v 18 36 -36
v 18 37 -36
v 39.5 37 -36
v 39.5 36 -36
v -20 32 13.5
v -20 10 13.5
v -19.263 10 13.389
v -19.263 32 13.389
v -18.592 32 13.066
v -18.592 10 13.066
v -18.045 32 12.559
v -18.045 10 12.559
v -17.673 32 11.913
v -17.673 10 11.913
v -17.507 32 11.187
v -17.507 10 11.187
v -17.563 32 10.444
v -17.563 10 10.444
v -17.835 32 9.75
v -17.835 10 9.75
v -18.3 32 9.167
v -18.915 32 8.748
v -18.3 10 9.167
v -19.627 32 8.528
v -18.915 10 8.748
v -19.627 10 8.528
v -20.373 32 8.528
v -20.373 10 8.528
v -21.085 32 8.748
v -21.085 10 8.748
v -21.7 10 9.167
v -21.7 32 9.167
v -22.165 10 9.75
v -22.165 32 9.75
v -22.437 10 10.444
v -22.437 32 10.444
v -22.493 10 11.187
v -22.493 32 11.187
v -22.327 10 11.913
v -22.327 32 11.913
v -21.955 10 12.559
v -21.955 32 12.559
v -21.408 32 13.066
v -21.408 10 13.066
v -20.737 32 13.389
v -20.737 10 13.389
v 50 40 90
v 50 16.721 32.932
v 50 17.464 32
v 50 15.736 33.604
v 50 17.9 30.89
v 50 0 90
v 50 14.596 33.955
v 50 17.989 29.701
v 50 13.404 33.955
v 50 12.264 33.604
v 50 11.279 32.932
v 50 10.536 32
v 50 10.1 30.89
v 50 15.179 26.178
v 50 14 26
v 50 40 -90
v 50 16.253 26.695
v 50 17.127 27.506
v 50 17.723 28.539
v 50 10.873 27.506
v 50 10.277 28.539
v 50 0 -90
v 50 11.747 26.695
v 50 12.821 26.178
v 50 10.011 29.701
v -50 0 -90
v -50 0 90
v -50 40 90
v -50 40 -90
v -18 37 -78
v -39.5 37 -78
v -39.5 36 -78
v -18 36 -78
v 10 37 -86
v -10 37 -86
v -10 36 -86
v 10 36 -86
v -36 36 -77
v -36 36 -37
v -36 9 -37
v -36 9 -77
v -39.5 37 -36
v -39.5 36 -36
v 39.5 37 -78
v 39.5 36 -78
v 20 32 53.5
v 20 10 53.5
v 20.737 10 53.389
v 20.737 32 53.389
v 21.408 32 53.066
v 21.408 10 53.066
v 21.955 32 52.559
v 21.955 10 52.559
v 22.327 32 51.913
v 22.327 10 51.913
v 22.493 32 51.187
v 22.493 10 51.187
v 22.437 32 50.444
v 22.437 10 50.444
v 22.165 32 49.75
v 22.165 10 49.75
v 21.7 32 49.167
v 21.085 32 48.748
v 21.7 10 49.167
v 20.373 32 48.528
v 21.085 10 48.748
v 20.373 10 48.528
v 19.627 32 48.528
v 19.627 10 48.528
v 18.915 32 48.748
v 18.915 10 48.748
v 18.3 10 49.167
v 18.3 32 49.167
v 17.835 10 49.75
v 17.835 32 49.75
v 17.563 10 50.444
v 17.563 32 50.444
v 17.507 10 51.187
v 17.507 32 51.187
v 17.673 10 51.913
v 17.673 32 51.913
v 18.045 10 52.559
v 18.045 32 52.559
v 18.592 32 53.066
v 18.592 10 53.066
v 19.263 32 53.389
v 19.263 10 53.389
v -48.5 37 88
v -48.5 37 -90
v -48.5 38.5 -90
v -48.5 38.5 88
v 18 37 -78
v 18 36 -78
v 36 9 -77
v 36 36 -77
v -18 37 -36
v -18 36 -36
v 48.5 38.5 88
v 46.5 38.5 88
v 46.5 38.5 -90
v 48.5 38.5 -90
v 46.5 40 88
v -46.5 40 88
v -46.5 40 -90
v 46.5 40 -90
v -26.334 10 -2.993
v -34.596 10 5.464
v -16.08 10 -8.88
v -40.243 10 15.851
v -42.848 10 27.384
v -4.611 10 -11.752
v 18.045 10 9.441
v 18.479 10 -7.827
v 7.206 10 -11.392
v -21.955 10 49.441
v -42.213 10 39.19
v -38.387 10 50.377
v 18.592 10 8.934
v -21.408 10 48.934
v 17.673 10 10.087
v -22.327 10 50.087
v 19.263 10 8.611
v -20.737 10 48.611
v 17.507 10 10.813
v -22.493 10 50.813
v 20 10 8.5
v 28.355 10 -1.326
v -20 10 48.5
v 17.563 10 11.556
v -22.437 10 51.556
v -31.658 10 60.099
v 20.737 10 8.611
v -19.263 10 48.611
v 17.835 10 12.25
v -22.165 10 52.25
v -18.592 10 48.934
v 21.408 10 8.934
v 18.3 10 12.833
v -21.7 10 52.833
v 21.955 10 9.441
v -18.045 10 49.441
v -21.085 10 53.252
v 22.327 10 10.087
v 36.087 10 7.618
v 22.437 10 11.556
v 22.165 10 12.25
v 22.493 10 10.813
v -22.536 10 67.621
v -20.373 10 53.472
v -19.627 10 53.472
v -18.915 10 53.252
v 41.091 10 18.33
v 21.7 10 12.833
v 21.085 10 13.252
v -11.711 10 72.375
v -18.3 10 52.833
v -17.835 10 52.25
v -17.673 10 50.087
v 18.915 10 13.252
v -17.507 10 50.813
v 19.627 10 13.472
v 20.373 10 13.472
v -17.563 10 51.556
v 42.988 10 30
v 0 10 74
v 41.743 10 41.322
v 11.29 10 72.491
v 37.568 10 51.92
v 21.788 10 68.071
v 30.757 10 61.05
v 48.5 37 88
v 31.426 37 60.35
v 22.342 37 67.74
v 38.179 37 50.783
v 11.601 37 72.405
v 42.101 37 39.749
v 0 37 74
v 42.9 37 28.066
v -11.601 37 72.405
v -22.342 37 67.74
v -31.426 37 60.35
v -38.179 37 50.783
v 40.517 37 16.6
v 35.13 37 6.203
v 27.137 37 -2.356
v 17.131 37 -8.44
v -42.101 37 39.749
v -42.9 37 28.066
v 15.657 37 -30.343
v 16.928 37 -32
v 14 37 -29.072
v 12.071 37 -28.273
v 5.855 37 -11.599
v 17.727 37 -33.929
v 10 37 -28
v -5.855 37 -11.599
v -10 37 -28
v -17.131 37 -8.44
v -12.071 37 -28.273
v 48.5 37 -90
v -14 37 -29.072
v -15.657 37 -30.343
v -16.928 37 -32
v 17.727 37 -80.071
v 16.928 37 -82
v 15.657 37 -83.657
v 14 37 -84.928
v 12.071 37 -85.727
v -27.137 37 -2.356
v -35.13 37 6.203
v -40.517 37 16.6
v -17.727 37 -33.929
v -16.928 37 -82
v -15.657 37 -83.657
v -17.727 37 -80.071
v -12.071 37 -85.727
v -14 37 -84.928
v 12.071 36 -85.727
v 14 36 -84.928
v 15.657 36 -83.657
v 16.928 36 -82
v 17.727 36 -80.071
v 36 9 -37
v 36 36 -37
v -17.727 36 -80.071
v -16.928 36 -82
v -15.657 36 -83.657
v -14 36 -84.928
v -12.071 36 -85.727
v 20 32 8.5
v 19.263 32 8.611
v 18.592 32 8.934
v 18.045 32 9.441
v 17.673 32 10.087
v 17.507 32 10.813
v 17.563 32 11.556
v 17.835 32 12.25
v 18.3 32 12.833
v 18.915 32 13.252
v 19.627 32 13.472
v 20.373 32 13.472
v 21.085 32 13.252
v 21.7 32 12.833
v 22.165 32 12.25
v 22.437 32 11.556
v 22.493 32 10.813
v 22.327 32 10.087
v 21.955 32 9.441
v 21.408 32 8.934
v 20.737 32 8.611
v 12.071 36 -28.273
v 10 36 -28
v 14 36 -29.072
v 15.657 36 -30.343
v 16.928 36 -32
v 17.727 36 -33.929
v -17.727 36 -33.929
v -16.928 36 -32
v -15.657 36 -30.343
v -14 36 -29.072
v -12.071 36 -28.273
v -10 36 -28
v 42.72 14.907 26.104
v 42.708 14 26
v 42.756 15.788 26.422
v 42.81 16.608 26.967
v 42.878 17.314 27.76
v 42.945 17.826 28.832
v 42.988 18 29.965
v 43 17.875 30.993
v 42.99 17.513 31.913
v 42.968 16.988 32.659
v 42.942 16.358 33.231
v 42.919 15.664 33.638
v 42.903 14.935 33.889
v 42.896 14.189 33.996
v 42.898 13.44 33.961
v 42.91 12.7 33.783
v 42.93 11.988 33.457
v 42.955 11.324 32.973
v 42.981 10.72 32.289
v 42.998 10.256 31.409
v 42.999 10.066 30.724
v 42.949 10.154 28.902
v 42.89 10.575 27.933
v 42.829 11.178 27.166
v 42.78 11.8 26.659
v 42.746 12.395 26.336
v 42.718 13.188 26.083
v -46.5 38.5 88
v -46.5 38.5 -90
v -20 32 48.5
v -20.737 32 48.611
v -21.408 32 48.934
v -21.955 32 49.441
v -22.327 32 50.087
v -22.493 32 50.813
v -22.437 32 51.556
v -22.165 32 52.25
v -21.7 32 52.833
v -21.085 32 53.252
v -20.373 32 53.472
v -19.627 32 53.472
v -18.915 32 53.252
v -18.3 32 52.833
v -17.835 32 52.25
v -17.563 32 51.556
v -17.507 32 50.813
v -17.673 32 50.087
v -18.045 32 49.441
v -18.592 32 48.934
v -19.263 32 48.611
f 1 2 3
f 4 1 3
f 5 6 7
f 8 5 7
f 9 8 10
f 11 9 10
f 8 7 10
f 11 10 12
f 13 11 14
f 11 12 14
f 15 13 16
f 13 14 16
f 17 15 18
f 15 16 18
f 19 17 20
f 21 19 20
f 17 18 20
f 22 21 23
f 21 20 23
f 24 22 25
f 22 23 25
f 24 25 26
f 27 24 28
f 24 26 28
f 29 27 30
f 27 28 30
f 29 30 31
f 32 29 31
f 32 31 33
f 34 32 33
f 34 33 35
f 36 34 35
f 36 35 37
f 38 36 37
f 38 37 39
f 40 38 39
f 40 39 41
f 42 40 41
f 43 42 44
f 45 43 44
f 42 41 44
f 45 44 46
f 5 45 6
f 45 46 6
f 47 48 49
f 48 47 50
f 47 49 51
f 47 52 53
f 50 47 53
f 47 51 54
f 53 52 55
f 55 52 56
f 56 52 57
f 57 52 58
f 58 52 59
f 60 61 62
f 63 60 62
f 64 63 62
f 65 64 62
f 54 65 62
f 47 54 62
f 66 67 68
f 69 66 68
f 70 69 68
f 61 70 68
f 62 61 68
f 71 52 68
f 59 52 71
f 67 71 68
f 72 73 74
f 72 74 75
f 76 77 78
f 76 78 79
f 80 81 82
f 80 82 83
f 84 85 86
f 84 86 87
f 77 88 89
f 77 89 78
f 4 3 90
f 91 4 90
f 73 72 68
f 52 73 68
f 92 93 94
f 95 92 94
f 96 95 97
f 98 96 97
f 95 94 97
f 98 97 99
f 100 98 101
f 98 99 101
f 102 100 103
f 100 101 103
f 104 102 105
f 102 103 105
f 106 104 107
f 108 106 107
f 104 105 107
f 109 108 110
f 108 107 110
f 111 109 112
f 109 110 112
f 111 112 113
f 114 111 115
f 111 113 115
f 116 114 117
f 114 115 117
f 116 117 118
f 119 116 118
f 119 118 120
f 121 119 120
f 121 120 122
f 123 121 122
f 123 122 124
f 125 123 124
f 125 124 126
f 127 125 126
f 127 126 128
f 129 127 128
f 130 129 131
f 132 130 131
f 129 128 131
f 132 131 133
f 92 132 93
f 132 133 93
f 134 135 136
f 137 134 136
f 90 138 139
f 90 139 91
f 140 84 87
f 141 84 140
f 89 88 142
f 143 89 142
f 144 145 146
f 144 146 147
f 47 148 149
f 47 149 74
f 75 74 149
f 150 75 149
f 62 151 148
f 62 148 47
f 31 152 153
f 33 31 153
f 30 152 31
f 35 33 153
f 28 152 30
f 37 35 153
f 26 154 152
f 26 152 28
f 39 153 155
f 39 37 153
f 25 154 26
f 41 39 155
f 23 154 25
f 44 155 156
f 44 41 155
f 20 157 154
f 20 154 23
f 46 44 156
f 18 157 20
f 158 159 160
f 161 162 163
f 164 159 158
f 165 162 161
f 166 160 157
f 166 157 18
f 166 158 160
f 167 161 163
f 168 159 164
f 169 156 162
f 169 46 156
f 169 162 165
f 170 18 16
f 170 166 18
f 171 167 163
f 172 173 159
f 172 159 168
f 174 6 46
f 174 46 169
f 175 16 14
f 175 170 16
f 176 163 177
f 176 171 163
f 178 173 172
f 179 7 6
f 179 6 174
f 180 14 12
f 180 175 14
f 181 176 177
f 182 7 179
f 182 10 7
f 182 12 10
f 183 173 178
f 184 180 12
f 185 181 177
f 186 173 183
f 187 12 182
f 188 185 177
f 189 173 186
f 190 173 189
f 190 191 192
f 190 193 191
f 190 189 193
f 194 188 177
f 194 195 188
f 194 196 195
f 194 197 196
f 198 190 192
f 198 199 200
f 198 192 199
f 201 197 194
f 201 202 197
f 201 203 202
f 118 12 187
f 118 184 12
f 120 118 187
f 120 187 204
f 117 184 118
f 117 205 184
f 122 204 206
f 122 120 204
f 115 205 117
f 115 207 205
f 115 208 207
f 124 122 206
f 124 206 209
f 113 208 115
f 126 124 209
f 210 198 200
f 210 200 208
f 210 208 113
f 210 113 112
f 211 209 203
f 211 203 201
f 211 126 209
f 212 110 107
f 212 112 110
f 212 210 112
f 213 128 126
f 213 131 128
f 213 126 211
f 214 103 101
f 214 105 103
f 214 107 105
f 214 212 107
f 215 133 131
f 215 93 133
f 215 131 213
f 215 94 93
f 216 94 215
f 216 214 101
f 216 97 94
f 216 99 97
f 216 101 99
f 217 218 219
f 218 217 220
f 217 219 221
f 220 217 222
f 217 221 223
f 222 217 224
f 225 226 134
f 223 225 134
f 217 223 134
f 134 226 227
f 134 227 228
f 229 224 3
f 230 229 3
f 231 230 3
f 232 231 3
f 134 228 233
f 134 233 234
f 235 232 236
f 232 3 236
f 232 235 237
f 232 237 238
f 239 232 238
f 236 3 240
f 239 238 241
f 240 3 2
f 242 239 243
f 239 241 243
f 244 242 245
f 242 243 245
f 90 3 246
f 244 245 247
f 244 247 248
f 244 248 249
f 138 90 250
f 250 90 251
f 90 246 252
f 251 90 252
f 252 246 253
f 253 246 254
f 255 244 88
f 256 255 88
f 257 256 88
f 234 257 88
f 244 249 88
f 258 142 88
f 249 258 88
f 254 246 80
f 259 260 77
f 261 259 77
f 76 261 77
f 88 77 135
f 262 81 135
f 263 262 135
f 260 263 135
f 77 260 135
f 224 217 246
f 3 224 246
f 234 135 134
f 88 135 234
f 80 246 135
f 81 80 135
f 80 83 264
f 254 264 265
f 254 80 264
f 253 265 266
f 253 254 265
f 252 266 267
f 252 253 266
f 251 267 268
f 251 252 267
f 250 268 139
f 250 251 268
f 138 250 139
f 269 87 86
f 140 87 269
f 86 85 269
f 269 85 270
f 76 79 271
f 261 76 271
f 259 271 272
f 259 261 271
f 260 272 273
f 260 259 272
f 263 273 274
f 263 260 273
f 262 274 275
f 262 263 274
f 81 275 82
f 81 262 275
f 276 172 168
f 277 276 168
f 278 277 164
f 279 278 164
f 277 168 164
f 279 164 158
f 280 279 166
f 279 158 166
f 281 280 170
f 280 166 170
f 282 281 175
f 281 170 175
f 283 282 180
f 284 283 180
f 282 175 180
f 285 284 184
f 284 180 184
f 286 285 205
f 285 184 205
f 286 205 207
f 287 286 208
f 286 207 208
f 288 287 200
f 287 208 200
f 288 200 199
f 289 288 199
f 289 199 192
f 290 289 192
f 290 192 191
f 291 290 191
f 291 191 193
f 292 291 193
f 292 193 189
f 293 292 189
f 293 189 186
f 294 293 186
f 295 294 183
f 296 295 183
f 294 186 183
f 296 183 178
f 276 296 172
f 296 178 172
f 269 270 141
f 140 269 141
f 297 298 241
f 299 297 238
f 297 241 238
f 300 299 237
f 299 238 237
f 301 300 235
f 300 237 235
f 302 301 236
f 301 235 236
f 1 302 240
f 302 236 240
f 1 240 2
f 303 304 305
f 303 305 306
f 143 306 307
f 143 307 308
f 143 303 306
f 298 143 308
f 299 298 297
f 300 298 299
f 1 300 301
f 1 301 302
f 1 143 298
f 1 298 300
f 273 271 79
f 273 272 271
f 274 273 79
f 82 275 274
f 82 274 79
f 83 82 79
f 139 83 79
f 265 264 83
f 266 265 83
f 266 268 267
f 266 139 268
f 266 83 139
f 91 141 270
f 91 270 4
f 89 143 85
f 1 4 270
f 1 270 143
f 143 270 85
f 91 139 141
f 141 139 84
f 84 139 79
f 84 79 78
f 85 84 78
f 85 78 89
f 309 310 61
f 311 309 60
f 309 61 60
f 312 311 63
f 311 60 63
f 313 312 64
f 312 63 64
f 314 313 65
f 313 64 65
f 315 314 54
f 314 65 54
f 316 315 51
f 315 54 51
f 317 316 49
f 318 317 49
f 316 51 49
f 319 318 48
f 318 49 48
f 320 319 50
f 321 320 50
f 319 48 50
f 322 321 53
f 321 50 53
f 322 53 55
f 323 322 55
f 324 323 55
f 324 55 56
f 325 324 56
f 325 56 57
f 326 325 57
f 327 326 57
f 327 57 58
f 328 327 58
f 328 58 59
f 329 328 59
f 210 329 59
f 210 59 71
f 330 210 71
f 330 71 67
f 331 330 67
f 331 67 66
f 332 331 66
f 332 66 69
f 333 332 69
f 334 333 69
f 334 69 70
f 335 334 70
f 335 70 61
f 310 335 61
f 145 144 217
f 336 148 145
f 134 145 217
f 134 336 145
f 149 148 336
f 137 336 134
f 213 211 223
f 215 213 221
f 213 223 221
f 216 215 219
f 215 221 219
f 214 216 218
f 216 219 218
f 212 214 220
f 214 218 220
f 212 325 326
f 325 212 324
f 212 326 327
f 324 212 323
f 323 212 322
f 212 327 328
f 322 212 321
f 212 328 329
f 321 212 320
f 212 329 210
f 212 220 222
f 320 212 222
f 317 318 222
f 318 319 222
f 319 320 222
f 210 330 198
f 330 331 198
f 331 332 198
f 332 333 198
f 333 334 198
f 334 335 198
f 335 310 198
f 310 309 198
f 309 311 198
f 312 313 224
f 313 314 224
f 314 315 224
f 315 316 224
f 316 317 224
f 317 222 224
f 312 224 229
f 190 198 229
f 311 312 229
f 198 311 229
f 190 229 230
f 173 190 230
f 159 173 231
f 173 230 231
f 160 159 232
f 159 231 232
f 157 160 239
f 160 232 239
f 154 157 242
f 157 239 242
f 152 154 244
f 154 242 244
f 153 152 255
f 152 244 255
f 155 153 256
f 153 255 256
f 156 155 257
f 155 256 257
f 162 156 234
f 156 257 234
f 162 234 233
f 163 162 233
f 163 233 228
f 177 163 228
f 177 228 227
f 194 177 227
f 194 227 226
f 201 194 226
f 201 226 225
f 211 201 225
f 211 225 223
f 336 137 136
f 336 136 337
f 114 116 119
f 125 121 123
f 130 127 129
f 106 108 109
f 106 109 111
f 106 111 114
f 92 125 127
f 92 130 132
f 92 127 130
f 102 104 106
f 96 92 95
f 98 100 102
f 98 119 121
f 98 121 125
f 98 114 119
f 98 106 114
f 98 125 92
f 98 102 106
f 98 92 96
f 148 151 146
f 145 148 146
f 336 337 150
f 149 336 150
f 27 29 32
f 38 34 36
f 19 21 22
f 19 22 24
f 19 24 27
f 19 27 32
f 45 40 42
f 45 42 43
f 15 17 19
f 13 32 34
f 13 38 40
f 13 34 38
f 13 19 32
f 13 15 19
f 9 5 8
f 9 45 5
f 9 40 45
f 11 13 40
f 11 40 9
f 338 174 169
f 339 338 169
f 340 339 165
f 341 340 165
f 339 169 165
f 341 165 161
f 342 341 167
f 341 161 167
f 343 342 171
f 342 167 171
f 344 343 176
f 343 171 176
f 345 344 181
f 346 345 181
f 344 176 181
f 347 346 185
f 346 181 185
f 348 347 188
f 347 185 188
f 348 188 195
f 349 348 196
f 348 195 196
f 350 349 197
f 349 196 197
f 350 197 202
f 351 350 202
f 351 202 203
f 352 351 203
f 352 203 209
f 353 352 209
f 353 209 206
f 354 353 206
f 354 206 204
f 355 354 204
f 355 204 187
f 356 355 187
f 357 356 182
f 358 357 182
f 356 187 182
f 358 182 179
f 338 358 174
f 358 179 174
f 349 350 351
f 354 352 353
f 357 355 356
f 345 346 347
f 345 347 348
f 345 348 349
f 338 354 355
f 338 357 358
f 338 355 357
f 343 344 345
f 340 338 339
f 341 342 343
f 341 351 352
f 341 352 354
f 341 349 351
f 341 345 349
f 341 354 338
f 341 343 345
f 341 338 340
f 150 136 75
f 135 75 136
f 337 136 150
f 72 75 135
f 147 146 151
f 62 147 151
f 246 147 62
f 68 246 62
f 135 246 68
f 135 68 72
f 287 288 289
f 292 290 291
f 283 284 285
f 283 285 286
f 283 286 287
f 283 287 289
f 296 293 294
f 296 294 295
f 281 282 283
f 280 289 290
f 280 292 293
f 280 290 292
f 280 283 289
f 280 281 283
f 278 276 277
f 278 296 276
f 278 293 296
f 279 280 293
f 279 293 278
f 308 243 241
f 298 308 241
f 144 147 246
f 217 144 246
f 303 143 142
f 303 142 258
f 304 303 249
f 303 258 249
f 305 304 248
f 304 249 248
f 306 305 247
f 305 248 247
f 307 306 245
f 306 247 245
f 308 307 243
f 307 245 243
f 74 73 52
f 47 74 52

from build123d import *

# Parameters (mm, degrees)
SKETCH_1_W               = 100
SKETCH_1_H               = 180
EXTRUDE_1_DEPTH          = 40
SKETCH_2_W               = 79
SKETCH_2_H               = 42
CUT_EXTRUDE_1_DEPTH      = 4
SKETCH_3_W               = 72
SKETCH_3_H               = 40
CUT_EXTRUDE_2_DEPTH      = 27
SKETCH_2_3_R             = 43
CUT_EXTRUDE_3_DEPTH      = 30
CUT_EXTRUDE_4_REACH      = 142.357
CUT_EXTRUDE_4_END_RADIUS = 43
SKETCH_4_R               = 4
SKETCH_5_R               = 2.5
EXTRUDE_2_DEPTH          = 22
CUT_EXTRUDE_5_DEPTH      = 4
CUT_EXTRUDE_6_DEPTH      = 178


with BuildPart() as part:
    # 草图1 → 凸台-拉伸1 (new body)
    with BuildSketch(Plane(origin=(0, 0, 0), x_dir=(1, 0, 0), z_dir=(0, 1, 0))):
        Rectangle(SKETCH_1_W, SKETCH_1_H)
    extrude(amount=EXTRUDE_1_DEPTH)

    # 草图2 → 切除-拉伸1 (cut)
    with BuildSketch(Plane(origin=(0, 40, 0), x_dir=(1, 0, 0), z_dir=(0, 1, 0))):
        with Locations((0, 57)):
            Rectangle(SKETCH_2_W, SKETCH_2_H)
    extrude(amount=-CUT_EXTRUDE_1_DEPTH, mode=Mode.SUBTRACT)

    # 草图3 → 切除-拉伸2 (cut)
    with BuildSketch(Plane(origin=(0, 36, 0), x_dir=(1, 0, 0), z_dir=(0, 1, 0))):
        with Locations((0, 57)):
            Rectangle(SKETCH_3_W, SKETCH_3_H)
    extrude(amount=-CUT_EXTRUDE_2_DEPTH, mode=Mode.SUBTRACT)

    # 草图2<3> → 切除-拉伸3 (cut)
    with BuildSketch(Plane(origin=(0, 40, 0), x_dir=(1, 0, 0), z_dir=(0, 1, 0))):
        with Locations(Location((0, -31, 0), (0, 0, 270))):
            Circle(SKETCH_2_3_R)
    extrude(amount=-CUT_EXTRUDE_3_DEPTH, mode=Mode.SUBTRACT)

    # 切除-拉伸4: up to this cylinder (the profile starts outside it)
    cut_extrude_4_end = Plane(origin=(0, 14, 31), z_dir=(0, 1, 0)) * Cylinder(CUT_EXTRUDE_4_END_RADIUS, 371.714, mode=Mode.PRIVATE)
    # 草图4 → 切除-拉伸4 (cut, up to the surface)
    with BuildSketch(Plane(origin=(50, 0, 0), x_dir=(0, 0, -1), z_dir=(1, 0, 0)), mode=Mode.PRIVATE) as cut_extrude_4_sk1:
        with Locations((-30, 14)):
            Circle(SKETCH_4_R)
    cut_extrude_4_tool1 = extrude(cut_extrude_4_sk1.sketch, amount=-CUT_EXTRUDE_4_REACH, mode=Mode.PRIVATE) - cut_extrude_4_end
    add(cut_extrude_4_tool1.solids().sort_by_distance((50, 14, 30))[0], mode=Mode.SUBTRACT)

    # 草图5 → 凸台-拉伸2 (add)
    with BuildSketch(Plane(origin=(0, 10, 0), x_dir=(1, 0, 0), z_dir=(0, 1, 0))):
        with Locations(Location((-20, -11, 0), (0, 0, 270))):
            Circle(SKETCH_5_R)
        with Locations(Location((20, -11, 0), (0, 0, 90))):
            Circle(SKETCH_5_R)
        with Locations(Location((-20, -51, 0), (0, 0, 90))):
            Circle(SKETCH_5_R)
        with Locations(Location((20, -51, 0), (0, 0, 270))):
            Circle(SKETCH_5_R)
    extrude(amount=EXTRUDE_2_DEPTH)

    # 草图6 → 切除-拉伸5 (cut)
    with BuildSketch(Plane(origin=(0, 40, 0), x_dir=(1, 0, 0), z_dir=(0, 1, 0))):
        with BuildLine():
            Line((-10, 86), (10, 86))
            ThreePointArc((10, 86), (18, 78), (10, 70))
            Line((10, 70), (-10, 70))
            ThreePointArc((-10, 70), (-18, 78), (-10, 86))
        make_face()
        with BuildLine():
            Line((-10, 28), (10, 28))
            ThreePointArc((10, 28), (18, 36), (10, 44))
            Line((10, 44), (-10, 44))
            ThreePointArc((-10, 44), (-18, 36), (-10, 28))
        make_face()
    extrude(amount=-CUT_EXTRUDE_5_DEPTH, mode=Mode.SUBTRACT)

    # 草图8 → 切除-拉伸6 (cut)
    with BuildSketch(Plane(origin=(0, 0, -90), x_dir=(-1, 0, 0), z_dir=(0, 0, -1))):
        Polygon((0, 40), (0, 37), (48.5, 37), (48.5, 38.5), (46.5, 38.5), (46.5, 40), align=None)
        Polygon((-48.5, 37), (0, 37), (0, 40), (-46.5, 40), (-46.5, 38.5), (-48.5, 38.5), align=None)
    extrude(amount=-CUT_EXTRUDE_6_DEPTH, mode=Mode.SUBTRACT)


solid = part.part
